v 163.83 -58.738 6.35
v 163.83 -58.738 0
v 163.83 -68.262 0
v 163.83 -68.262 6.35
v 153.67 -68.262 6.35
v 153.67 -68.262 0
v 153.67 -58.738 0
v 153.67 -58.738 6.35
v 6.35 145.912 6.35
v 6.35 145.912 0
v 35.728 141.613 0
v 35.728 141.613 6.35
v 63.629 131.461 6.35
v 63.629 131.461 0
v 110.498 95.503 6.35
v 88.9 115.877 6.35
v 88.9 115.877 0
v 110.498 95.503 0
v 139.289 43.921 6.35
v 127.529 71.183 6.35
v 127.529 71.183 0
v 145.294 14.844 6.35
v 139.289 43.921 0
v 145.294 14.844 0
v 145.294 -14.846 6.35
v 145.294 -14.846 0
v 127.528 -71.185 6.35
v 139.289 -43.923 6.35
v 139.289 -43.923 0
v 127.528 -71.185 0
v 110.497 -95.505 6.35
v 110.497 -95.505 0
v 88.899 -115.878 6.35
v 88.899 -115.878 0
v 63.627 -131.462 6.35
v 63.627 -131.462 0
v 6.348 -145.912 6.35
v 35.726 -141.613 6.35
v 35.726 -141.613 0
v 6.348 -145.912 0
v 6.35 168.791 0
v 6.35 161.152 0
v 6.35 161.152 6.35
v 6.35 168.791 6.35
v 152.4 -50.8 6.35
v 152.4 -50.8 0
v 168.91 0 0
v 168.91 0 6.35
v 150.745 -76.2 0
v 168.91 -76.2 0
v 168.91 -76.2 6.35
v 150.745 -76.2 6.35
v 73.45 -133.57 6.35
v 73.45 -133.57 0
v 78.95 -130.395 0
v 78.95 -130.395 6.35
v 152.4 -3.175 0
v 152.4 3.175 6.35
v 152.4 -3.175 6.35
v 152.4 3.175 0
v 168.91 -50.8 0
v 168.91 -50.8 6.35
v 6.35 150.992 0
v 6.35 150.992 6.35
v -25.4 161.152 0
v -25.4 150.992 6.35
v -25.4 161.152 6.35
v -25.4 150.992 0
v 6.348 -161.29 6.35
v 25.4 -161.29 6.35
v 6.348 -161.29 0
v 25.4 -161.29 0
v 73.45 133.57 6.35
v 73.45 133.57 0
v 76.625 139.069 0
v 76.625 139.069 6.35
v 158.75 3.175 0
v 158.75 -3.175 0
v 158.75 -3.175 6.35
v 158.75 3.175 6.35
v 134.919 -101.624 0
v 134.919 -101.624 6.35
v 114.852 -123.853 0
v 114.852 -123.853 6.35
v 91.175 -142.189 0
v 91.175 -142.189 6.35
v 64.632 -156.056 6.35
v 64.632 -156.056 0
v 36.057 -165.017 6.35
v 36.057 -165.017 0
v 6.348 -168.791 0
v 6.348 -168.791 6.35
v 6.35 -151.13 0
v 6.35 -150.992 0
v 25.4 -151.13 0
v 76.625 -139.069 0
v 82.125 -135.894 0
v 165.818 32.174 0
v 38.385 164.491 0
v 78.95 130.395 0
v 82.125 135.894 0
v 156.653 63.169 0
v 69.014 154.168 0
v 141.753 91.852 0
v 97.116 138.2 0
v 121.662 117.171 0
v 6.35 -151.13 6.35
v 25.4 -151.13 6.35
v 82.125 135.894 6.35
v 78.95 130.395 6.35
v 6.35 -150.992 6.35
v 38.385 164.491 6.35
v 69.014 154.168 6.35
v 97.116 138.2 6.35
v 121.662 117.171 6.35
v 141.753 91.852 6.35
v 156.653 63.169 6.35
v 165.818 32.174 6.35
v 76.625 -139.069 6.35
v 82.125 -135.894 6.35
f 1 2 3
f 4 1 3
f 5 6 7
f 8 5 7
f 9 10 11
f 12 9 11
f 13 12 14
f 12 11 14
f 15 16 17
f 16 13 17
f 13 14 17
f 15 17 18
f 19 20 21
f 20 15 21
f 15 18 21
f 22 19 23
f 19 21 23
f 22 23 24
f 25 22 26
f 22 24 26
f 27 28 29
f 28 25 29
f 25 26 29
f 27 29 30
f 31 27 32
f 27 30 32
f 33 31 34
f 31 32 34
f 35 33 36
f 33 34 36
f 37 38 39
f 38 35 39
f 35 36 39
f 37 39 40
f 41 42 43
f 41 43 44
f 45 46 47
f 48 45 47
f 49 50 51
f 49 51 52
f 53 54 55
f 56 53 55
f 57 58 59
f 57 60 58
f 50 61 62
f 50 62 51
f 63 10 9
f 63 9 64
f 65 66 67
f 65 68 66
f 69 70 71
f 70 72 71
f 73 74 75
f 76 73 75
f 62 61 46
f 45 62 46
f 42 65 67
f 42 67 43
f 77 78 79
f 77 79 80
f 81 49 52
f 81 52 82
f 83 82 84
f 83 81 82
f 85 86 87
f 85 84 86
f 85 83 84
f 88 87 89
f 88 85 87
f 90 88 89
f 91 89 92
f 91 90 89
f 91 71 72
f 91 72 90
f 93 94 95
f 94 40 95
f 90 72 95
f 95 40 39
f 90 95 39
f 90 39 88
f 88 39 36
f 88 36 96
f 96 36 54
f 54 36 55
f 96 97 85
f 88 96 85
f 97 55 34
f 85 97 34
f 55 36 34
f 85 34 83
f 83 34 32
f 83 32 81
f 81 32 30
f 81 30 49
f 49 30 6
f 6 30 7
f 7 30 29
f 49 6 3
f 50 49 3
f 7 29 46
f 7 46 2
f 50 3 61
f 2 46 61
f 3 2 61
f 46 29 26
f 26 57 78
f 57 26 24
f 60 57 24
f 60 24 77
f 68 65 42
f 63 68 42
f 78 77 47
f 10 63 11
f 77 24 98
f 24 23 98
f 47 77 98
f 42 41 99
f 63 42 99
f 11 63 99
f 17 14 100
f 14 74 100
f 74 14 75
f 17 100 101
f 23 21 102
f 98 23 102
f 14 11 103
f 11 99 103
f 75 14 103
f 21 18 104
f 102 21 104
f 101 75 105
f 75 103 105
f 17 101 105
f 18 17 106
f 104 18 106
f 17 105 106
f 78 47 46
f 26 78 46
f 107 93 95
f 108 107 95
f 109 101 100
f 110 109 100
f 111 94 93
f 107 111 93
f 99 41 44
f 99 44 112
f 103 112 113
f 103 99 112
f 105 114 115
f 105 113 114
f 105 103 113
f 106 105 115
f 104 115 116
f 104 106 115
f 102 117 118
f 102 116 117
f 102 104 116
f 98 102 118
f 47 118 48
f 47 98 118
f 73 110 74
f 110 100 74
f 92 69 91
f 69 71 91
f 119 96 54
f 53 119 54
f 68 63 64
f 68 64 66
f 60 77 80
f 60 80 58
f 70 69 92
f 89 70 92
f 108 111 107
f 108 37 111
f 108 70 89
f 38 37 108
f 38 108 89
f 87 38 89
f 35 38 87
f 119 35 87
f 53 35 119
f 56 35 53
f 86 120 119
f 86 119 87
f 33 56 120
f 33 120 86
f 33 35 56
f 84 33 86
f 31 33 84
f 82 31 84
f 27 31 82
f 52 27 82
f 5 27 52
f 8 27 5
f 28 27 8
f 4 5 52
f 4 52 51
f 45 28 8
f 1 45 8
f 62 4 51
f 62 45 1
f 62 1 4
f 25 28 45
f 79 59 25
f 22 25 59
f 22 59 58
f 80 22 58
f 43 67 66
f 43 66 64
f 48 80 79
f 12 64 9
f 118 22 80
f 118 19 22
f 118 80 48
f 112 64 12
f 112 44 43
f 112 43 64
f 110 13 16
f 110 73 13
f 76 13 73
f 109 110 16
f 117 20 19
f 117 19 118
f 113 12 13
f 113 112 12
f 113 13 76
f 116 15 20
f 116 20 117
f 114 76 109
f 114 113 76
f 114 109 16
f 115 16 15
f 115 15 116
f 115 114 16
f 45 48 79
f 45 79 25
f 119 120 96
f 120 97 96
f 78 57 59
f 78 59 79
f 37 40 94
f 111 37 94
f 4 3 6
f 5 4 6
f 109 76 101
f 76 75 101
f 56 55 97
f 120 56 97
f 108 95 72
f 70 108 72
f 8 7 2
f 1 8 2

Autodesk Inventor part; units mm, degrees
ref_plane "YZ Plane" through (0, 0, 0) normal (1, 0, 0) x (0, 1, 0)
ref_plane "XZ Plane" through (0, 0, 0) normal (0, 1, 0) x (-1, 0, 0)
ref_plane "XY Plane" through (0, 0, 0) normal (0, 0, 1) x (1, 0, 0)
sketch "Sketch1" plane through (0, 0, 0) normal (0, 0, 1) x (1, 0, 0)
  arc A0 (6.3485, -145.912) -> (6.35, 145.9119) centre (0, 0) ccw
  line L0 (6.35, -150.9919) -> (6.35, -151.13)
  line L1 (6.35, 145.9119) -> (6.35, 168.7906)
  line L2 (0, 0) -> (0, 200.5264) construction
  line L3 (6.35, 145.9119) -> (6.35, 150.9919) construction
  line L4 (6.35, 150.9919) -> (-25.4, 150.9919)
  line L5 (-25.4, 150.9919) -> (-25.4, 161.1519)
  line L6 (-25.4, 161.1519) -> (6.35, 161.1519)
  line L7 (0, -146.05) -> (0, 0) construction
  line L8 (168.91, 0) -> (168.91, -76.2)
  line L9 (168.91, -76.2) -> (150.7453, -76.2)
  line L10 (0, 0) -> (0, -63.5) construction
  line L11 (0, -63.5) -> (158.75, -63.5) construction
  line L12 (158.75, -58.7375) -> (163.83, -58.7375)
  line L13 (163.83, -58.7375) -> (163.83, -68.2625)
  line L14 (163.83, -68.2625) -> (153.67, -68.2625)
  line L15 (153.67, -68.2625) -> (153.67, -58.7375)
  line L16 (153.67, -58.7375) -> (158.75, -58.7375)
  arc A1 (6.3485, -168.7907) -> (150.7453, -76.2) centre (0, 0) ccw
  line L17 (6.35, 161.1519) -> (-6.35, 161.1519) construction
  line L18 (-6.35, 161.1519) -> (-6.35, 168.7906) construction
  line L19 (0, -146.05) -> (0, -151.13) construction
  line L20 (6.3485, -151.13) -> (25.4, -151.13)
  line L21 (25.4, -151.13) -> (25.4, -161.29)
  line L22 (25.4, -161.29) -> (6.3485, -161.29)
  arc A2 (168.91, 0) -> (6.35, 168.7906) centre (0, 0) ccw
  line L23 (0, -146.05) -> (6.3485, -145.912) construction
  line L24 (6.3485, -145.912) -> (6.3485, -151.13)
  line L25 (6.3485, -161.29) -> (6.3485, -168.7907)
  line L26 (6.3485, -145.912) -> (6.3485, -151.13) construction
  line L27 (6.3485, -161.29) -> (6.3485, -184.4747) construction
  line L28 (0, 0) -> (762, -1319.8227) construction
  line L29 (0, 0) -> (1524, 0) construction
  line L30 (0, 0) -> (158.4844, 274.503) construction
  line L31 (0, 0) -> (316.9688, 0) construction
  line L32 (76.2, -131.9823) -> (78.9496, -130.3948)
  line L33 (78.9496, -130.3948) -> (82.1246, -135.894)
  line L34 (82.1246, -135.894) -> (76.6254, -139.069)
  line L35 (76.6254, -139.069) -> (73.4504, -133.5698)
  line L36 (73.4504, -133.5698) -> (76.2, -131.9823)
  line L37 (152.4, 0) -> (152.4, -3.175)
  line L38 (152.4, -3.175) -> (158.75, -3.175)
  line L39 (158.75, -3.175) -> (158.75, 3.175)
  line L40 (158.75, 3.175) -> (152.4, 3.175)
  line L41 (152.4, 3.175) -> (152.4, -3.175)
  line L42 (73.4504, 133.5698) -> (76.6254, 139.069)
  line L43 (76.6254, 139.069) -> (82.1246, 135.894)
  line L44 (82.1246, 135.894) -> (78.9496, 130.3948)
  line L45 (78.9496, 130.3948) -> (73.4504, 133.5698)
  line L46 (168.91, -76.2) -> (168.91, -50.8) construction
  line L47 (168.91, -50.8) -> (152.4, -50.8)
  line L48 (152.4, -50.8) -> (168.91, 0)
  line L49 (168.91, -50.8) -> (168.91, 0)
  point P0 (6.35, -145.9119)
  point P1 (0.0447, 168.91)
  point P2 (6.3947, 145.9099)
  dimension "d51" = 292.1
  dimension "d72" = 6.35
  dimension "d73" = 5.08
  dimension "d75" = 31.75
  dimension "d76" = 10.16
  dimension "d82" = 76.2
  dimension "d86" = 63.5
  dimension "d87" = 158.75
  dimension "d89" = 4.7625
  dimension "d90" = 5.08
  dimension "d91" = 9.525
  dimension "d92" = 10.16
  dimension "d93" = 4.7625
  dimension "d100" = 12.7
  dimension "d101" = 5.08
  dimension "d103" = 25.4
  dimension "d104" = 10.16
  dimension "d105" = 6.35
  dimension "d106" = 7.5007
  dimension "d107" = 25.4
  dimension "d113" = 1524
  dimension "d114" = 60
  dimension "d115" = 60
  dimension "d121" = 3.175
  dimension "d122" = 6.35
  dimension "d123" = 152.4
  dimension "d124" = 6.35
  dimension "d125" = 3.175
  dimension "d126" = 6.35
  dimension "d127" = 6.35
  dimension "d128" = 152.4
  dimension "d130" = 6.35
  dimension "d131" = 6.35
  dimension "d132" = 6.35
  dimension "d133" = 3.175
  dimension "d134" = 152.4
  dimension "d139" = 25.4
  dimension "d140" = 71.996
extrude "Extrusion21" add sketch "Sketch1" along normal blind 6.35 contours A0 L1 A2 L48 L47 L8 L9 A1 L25 L22 L21 L20 L0 L24 | L4 L5 L6 L1
properties part number "TopHoopSection_v4"
